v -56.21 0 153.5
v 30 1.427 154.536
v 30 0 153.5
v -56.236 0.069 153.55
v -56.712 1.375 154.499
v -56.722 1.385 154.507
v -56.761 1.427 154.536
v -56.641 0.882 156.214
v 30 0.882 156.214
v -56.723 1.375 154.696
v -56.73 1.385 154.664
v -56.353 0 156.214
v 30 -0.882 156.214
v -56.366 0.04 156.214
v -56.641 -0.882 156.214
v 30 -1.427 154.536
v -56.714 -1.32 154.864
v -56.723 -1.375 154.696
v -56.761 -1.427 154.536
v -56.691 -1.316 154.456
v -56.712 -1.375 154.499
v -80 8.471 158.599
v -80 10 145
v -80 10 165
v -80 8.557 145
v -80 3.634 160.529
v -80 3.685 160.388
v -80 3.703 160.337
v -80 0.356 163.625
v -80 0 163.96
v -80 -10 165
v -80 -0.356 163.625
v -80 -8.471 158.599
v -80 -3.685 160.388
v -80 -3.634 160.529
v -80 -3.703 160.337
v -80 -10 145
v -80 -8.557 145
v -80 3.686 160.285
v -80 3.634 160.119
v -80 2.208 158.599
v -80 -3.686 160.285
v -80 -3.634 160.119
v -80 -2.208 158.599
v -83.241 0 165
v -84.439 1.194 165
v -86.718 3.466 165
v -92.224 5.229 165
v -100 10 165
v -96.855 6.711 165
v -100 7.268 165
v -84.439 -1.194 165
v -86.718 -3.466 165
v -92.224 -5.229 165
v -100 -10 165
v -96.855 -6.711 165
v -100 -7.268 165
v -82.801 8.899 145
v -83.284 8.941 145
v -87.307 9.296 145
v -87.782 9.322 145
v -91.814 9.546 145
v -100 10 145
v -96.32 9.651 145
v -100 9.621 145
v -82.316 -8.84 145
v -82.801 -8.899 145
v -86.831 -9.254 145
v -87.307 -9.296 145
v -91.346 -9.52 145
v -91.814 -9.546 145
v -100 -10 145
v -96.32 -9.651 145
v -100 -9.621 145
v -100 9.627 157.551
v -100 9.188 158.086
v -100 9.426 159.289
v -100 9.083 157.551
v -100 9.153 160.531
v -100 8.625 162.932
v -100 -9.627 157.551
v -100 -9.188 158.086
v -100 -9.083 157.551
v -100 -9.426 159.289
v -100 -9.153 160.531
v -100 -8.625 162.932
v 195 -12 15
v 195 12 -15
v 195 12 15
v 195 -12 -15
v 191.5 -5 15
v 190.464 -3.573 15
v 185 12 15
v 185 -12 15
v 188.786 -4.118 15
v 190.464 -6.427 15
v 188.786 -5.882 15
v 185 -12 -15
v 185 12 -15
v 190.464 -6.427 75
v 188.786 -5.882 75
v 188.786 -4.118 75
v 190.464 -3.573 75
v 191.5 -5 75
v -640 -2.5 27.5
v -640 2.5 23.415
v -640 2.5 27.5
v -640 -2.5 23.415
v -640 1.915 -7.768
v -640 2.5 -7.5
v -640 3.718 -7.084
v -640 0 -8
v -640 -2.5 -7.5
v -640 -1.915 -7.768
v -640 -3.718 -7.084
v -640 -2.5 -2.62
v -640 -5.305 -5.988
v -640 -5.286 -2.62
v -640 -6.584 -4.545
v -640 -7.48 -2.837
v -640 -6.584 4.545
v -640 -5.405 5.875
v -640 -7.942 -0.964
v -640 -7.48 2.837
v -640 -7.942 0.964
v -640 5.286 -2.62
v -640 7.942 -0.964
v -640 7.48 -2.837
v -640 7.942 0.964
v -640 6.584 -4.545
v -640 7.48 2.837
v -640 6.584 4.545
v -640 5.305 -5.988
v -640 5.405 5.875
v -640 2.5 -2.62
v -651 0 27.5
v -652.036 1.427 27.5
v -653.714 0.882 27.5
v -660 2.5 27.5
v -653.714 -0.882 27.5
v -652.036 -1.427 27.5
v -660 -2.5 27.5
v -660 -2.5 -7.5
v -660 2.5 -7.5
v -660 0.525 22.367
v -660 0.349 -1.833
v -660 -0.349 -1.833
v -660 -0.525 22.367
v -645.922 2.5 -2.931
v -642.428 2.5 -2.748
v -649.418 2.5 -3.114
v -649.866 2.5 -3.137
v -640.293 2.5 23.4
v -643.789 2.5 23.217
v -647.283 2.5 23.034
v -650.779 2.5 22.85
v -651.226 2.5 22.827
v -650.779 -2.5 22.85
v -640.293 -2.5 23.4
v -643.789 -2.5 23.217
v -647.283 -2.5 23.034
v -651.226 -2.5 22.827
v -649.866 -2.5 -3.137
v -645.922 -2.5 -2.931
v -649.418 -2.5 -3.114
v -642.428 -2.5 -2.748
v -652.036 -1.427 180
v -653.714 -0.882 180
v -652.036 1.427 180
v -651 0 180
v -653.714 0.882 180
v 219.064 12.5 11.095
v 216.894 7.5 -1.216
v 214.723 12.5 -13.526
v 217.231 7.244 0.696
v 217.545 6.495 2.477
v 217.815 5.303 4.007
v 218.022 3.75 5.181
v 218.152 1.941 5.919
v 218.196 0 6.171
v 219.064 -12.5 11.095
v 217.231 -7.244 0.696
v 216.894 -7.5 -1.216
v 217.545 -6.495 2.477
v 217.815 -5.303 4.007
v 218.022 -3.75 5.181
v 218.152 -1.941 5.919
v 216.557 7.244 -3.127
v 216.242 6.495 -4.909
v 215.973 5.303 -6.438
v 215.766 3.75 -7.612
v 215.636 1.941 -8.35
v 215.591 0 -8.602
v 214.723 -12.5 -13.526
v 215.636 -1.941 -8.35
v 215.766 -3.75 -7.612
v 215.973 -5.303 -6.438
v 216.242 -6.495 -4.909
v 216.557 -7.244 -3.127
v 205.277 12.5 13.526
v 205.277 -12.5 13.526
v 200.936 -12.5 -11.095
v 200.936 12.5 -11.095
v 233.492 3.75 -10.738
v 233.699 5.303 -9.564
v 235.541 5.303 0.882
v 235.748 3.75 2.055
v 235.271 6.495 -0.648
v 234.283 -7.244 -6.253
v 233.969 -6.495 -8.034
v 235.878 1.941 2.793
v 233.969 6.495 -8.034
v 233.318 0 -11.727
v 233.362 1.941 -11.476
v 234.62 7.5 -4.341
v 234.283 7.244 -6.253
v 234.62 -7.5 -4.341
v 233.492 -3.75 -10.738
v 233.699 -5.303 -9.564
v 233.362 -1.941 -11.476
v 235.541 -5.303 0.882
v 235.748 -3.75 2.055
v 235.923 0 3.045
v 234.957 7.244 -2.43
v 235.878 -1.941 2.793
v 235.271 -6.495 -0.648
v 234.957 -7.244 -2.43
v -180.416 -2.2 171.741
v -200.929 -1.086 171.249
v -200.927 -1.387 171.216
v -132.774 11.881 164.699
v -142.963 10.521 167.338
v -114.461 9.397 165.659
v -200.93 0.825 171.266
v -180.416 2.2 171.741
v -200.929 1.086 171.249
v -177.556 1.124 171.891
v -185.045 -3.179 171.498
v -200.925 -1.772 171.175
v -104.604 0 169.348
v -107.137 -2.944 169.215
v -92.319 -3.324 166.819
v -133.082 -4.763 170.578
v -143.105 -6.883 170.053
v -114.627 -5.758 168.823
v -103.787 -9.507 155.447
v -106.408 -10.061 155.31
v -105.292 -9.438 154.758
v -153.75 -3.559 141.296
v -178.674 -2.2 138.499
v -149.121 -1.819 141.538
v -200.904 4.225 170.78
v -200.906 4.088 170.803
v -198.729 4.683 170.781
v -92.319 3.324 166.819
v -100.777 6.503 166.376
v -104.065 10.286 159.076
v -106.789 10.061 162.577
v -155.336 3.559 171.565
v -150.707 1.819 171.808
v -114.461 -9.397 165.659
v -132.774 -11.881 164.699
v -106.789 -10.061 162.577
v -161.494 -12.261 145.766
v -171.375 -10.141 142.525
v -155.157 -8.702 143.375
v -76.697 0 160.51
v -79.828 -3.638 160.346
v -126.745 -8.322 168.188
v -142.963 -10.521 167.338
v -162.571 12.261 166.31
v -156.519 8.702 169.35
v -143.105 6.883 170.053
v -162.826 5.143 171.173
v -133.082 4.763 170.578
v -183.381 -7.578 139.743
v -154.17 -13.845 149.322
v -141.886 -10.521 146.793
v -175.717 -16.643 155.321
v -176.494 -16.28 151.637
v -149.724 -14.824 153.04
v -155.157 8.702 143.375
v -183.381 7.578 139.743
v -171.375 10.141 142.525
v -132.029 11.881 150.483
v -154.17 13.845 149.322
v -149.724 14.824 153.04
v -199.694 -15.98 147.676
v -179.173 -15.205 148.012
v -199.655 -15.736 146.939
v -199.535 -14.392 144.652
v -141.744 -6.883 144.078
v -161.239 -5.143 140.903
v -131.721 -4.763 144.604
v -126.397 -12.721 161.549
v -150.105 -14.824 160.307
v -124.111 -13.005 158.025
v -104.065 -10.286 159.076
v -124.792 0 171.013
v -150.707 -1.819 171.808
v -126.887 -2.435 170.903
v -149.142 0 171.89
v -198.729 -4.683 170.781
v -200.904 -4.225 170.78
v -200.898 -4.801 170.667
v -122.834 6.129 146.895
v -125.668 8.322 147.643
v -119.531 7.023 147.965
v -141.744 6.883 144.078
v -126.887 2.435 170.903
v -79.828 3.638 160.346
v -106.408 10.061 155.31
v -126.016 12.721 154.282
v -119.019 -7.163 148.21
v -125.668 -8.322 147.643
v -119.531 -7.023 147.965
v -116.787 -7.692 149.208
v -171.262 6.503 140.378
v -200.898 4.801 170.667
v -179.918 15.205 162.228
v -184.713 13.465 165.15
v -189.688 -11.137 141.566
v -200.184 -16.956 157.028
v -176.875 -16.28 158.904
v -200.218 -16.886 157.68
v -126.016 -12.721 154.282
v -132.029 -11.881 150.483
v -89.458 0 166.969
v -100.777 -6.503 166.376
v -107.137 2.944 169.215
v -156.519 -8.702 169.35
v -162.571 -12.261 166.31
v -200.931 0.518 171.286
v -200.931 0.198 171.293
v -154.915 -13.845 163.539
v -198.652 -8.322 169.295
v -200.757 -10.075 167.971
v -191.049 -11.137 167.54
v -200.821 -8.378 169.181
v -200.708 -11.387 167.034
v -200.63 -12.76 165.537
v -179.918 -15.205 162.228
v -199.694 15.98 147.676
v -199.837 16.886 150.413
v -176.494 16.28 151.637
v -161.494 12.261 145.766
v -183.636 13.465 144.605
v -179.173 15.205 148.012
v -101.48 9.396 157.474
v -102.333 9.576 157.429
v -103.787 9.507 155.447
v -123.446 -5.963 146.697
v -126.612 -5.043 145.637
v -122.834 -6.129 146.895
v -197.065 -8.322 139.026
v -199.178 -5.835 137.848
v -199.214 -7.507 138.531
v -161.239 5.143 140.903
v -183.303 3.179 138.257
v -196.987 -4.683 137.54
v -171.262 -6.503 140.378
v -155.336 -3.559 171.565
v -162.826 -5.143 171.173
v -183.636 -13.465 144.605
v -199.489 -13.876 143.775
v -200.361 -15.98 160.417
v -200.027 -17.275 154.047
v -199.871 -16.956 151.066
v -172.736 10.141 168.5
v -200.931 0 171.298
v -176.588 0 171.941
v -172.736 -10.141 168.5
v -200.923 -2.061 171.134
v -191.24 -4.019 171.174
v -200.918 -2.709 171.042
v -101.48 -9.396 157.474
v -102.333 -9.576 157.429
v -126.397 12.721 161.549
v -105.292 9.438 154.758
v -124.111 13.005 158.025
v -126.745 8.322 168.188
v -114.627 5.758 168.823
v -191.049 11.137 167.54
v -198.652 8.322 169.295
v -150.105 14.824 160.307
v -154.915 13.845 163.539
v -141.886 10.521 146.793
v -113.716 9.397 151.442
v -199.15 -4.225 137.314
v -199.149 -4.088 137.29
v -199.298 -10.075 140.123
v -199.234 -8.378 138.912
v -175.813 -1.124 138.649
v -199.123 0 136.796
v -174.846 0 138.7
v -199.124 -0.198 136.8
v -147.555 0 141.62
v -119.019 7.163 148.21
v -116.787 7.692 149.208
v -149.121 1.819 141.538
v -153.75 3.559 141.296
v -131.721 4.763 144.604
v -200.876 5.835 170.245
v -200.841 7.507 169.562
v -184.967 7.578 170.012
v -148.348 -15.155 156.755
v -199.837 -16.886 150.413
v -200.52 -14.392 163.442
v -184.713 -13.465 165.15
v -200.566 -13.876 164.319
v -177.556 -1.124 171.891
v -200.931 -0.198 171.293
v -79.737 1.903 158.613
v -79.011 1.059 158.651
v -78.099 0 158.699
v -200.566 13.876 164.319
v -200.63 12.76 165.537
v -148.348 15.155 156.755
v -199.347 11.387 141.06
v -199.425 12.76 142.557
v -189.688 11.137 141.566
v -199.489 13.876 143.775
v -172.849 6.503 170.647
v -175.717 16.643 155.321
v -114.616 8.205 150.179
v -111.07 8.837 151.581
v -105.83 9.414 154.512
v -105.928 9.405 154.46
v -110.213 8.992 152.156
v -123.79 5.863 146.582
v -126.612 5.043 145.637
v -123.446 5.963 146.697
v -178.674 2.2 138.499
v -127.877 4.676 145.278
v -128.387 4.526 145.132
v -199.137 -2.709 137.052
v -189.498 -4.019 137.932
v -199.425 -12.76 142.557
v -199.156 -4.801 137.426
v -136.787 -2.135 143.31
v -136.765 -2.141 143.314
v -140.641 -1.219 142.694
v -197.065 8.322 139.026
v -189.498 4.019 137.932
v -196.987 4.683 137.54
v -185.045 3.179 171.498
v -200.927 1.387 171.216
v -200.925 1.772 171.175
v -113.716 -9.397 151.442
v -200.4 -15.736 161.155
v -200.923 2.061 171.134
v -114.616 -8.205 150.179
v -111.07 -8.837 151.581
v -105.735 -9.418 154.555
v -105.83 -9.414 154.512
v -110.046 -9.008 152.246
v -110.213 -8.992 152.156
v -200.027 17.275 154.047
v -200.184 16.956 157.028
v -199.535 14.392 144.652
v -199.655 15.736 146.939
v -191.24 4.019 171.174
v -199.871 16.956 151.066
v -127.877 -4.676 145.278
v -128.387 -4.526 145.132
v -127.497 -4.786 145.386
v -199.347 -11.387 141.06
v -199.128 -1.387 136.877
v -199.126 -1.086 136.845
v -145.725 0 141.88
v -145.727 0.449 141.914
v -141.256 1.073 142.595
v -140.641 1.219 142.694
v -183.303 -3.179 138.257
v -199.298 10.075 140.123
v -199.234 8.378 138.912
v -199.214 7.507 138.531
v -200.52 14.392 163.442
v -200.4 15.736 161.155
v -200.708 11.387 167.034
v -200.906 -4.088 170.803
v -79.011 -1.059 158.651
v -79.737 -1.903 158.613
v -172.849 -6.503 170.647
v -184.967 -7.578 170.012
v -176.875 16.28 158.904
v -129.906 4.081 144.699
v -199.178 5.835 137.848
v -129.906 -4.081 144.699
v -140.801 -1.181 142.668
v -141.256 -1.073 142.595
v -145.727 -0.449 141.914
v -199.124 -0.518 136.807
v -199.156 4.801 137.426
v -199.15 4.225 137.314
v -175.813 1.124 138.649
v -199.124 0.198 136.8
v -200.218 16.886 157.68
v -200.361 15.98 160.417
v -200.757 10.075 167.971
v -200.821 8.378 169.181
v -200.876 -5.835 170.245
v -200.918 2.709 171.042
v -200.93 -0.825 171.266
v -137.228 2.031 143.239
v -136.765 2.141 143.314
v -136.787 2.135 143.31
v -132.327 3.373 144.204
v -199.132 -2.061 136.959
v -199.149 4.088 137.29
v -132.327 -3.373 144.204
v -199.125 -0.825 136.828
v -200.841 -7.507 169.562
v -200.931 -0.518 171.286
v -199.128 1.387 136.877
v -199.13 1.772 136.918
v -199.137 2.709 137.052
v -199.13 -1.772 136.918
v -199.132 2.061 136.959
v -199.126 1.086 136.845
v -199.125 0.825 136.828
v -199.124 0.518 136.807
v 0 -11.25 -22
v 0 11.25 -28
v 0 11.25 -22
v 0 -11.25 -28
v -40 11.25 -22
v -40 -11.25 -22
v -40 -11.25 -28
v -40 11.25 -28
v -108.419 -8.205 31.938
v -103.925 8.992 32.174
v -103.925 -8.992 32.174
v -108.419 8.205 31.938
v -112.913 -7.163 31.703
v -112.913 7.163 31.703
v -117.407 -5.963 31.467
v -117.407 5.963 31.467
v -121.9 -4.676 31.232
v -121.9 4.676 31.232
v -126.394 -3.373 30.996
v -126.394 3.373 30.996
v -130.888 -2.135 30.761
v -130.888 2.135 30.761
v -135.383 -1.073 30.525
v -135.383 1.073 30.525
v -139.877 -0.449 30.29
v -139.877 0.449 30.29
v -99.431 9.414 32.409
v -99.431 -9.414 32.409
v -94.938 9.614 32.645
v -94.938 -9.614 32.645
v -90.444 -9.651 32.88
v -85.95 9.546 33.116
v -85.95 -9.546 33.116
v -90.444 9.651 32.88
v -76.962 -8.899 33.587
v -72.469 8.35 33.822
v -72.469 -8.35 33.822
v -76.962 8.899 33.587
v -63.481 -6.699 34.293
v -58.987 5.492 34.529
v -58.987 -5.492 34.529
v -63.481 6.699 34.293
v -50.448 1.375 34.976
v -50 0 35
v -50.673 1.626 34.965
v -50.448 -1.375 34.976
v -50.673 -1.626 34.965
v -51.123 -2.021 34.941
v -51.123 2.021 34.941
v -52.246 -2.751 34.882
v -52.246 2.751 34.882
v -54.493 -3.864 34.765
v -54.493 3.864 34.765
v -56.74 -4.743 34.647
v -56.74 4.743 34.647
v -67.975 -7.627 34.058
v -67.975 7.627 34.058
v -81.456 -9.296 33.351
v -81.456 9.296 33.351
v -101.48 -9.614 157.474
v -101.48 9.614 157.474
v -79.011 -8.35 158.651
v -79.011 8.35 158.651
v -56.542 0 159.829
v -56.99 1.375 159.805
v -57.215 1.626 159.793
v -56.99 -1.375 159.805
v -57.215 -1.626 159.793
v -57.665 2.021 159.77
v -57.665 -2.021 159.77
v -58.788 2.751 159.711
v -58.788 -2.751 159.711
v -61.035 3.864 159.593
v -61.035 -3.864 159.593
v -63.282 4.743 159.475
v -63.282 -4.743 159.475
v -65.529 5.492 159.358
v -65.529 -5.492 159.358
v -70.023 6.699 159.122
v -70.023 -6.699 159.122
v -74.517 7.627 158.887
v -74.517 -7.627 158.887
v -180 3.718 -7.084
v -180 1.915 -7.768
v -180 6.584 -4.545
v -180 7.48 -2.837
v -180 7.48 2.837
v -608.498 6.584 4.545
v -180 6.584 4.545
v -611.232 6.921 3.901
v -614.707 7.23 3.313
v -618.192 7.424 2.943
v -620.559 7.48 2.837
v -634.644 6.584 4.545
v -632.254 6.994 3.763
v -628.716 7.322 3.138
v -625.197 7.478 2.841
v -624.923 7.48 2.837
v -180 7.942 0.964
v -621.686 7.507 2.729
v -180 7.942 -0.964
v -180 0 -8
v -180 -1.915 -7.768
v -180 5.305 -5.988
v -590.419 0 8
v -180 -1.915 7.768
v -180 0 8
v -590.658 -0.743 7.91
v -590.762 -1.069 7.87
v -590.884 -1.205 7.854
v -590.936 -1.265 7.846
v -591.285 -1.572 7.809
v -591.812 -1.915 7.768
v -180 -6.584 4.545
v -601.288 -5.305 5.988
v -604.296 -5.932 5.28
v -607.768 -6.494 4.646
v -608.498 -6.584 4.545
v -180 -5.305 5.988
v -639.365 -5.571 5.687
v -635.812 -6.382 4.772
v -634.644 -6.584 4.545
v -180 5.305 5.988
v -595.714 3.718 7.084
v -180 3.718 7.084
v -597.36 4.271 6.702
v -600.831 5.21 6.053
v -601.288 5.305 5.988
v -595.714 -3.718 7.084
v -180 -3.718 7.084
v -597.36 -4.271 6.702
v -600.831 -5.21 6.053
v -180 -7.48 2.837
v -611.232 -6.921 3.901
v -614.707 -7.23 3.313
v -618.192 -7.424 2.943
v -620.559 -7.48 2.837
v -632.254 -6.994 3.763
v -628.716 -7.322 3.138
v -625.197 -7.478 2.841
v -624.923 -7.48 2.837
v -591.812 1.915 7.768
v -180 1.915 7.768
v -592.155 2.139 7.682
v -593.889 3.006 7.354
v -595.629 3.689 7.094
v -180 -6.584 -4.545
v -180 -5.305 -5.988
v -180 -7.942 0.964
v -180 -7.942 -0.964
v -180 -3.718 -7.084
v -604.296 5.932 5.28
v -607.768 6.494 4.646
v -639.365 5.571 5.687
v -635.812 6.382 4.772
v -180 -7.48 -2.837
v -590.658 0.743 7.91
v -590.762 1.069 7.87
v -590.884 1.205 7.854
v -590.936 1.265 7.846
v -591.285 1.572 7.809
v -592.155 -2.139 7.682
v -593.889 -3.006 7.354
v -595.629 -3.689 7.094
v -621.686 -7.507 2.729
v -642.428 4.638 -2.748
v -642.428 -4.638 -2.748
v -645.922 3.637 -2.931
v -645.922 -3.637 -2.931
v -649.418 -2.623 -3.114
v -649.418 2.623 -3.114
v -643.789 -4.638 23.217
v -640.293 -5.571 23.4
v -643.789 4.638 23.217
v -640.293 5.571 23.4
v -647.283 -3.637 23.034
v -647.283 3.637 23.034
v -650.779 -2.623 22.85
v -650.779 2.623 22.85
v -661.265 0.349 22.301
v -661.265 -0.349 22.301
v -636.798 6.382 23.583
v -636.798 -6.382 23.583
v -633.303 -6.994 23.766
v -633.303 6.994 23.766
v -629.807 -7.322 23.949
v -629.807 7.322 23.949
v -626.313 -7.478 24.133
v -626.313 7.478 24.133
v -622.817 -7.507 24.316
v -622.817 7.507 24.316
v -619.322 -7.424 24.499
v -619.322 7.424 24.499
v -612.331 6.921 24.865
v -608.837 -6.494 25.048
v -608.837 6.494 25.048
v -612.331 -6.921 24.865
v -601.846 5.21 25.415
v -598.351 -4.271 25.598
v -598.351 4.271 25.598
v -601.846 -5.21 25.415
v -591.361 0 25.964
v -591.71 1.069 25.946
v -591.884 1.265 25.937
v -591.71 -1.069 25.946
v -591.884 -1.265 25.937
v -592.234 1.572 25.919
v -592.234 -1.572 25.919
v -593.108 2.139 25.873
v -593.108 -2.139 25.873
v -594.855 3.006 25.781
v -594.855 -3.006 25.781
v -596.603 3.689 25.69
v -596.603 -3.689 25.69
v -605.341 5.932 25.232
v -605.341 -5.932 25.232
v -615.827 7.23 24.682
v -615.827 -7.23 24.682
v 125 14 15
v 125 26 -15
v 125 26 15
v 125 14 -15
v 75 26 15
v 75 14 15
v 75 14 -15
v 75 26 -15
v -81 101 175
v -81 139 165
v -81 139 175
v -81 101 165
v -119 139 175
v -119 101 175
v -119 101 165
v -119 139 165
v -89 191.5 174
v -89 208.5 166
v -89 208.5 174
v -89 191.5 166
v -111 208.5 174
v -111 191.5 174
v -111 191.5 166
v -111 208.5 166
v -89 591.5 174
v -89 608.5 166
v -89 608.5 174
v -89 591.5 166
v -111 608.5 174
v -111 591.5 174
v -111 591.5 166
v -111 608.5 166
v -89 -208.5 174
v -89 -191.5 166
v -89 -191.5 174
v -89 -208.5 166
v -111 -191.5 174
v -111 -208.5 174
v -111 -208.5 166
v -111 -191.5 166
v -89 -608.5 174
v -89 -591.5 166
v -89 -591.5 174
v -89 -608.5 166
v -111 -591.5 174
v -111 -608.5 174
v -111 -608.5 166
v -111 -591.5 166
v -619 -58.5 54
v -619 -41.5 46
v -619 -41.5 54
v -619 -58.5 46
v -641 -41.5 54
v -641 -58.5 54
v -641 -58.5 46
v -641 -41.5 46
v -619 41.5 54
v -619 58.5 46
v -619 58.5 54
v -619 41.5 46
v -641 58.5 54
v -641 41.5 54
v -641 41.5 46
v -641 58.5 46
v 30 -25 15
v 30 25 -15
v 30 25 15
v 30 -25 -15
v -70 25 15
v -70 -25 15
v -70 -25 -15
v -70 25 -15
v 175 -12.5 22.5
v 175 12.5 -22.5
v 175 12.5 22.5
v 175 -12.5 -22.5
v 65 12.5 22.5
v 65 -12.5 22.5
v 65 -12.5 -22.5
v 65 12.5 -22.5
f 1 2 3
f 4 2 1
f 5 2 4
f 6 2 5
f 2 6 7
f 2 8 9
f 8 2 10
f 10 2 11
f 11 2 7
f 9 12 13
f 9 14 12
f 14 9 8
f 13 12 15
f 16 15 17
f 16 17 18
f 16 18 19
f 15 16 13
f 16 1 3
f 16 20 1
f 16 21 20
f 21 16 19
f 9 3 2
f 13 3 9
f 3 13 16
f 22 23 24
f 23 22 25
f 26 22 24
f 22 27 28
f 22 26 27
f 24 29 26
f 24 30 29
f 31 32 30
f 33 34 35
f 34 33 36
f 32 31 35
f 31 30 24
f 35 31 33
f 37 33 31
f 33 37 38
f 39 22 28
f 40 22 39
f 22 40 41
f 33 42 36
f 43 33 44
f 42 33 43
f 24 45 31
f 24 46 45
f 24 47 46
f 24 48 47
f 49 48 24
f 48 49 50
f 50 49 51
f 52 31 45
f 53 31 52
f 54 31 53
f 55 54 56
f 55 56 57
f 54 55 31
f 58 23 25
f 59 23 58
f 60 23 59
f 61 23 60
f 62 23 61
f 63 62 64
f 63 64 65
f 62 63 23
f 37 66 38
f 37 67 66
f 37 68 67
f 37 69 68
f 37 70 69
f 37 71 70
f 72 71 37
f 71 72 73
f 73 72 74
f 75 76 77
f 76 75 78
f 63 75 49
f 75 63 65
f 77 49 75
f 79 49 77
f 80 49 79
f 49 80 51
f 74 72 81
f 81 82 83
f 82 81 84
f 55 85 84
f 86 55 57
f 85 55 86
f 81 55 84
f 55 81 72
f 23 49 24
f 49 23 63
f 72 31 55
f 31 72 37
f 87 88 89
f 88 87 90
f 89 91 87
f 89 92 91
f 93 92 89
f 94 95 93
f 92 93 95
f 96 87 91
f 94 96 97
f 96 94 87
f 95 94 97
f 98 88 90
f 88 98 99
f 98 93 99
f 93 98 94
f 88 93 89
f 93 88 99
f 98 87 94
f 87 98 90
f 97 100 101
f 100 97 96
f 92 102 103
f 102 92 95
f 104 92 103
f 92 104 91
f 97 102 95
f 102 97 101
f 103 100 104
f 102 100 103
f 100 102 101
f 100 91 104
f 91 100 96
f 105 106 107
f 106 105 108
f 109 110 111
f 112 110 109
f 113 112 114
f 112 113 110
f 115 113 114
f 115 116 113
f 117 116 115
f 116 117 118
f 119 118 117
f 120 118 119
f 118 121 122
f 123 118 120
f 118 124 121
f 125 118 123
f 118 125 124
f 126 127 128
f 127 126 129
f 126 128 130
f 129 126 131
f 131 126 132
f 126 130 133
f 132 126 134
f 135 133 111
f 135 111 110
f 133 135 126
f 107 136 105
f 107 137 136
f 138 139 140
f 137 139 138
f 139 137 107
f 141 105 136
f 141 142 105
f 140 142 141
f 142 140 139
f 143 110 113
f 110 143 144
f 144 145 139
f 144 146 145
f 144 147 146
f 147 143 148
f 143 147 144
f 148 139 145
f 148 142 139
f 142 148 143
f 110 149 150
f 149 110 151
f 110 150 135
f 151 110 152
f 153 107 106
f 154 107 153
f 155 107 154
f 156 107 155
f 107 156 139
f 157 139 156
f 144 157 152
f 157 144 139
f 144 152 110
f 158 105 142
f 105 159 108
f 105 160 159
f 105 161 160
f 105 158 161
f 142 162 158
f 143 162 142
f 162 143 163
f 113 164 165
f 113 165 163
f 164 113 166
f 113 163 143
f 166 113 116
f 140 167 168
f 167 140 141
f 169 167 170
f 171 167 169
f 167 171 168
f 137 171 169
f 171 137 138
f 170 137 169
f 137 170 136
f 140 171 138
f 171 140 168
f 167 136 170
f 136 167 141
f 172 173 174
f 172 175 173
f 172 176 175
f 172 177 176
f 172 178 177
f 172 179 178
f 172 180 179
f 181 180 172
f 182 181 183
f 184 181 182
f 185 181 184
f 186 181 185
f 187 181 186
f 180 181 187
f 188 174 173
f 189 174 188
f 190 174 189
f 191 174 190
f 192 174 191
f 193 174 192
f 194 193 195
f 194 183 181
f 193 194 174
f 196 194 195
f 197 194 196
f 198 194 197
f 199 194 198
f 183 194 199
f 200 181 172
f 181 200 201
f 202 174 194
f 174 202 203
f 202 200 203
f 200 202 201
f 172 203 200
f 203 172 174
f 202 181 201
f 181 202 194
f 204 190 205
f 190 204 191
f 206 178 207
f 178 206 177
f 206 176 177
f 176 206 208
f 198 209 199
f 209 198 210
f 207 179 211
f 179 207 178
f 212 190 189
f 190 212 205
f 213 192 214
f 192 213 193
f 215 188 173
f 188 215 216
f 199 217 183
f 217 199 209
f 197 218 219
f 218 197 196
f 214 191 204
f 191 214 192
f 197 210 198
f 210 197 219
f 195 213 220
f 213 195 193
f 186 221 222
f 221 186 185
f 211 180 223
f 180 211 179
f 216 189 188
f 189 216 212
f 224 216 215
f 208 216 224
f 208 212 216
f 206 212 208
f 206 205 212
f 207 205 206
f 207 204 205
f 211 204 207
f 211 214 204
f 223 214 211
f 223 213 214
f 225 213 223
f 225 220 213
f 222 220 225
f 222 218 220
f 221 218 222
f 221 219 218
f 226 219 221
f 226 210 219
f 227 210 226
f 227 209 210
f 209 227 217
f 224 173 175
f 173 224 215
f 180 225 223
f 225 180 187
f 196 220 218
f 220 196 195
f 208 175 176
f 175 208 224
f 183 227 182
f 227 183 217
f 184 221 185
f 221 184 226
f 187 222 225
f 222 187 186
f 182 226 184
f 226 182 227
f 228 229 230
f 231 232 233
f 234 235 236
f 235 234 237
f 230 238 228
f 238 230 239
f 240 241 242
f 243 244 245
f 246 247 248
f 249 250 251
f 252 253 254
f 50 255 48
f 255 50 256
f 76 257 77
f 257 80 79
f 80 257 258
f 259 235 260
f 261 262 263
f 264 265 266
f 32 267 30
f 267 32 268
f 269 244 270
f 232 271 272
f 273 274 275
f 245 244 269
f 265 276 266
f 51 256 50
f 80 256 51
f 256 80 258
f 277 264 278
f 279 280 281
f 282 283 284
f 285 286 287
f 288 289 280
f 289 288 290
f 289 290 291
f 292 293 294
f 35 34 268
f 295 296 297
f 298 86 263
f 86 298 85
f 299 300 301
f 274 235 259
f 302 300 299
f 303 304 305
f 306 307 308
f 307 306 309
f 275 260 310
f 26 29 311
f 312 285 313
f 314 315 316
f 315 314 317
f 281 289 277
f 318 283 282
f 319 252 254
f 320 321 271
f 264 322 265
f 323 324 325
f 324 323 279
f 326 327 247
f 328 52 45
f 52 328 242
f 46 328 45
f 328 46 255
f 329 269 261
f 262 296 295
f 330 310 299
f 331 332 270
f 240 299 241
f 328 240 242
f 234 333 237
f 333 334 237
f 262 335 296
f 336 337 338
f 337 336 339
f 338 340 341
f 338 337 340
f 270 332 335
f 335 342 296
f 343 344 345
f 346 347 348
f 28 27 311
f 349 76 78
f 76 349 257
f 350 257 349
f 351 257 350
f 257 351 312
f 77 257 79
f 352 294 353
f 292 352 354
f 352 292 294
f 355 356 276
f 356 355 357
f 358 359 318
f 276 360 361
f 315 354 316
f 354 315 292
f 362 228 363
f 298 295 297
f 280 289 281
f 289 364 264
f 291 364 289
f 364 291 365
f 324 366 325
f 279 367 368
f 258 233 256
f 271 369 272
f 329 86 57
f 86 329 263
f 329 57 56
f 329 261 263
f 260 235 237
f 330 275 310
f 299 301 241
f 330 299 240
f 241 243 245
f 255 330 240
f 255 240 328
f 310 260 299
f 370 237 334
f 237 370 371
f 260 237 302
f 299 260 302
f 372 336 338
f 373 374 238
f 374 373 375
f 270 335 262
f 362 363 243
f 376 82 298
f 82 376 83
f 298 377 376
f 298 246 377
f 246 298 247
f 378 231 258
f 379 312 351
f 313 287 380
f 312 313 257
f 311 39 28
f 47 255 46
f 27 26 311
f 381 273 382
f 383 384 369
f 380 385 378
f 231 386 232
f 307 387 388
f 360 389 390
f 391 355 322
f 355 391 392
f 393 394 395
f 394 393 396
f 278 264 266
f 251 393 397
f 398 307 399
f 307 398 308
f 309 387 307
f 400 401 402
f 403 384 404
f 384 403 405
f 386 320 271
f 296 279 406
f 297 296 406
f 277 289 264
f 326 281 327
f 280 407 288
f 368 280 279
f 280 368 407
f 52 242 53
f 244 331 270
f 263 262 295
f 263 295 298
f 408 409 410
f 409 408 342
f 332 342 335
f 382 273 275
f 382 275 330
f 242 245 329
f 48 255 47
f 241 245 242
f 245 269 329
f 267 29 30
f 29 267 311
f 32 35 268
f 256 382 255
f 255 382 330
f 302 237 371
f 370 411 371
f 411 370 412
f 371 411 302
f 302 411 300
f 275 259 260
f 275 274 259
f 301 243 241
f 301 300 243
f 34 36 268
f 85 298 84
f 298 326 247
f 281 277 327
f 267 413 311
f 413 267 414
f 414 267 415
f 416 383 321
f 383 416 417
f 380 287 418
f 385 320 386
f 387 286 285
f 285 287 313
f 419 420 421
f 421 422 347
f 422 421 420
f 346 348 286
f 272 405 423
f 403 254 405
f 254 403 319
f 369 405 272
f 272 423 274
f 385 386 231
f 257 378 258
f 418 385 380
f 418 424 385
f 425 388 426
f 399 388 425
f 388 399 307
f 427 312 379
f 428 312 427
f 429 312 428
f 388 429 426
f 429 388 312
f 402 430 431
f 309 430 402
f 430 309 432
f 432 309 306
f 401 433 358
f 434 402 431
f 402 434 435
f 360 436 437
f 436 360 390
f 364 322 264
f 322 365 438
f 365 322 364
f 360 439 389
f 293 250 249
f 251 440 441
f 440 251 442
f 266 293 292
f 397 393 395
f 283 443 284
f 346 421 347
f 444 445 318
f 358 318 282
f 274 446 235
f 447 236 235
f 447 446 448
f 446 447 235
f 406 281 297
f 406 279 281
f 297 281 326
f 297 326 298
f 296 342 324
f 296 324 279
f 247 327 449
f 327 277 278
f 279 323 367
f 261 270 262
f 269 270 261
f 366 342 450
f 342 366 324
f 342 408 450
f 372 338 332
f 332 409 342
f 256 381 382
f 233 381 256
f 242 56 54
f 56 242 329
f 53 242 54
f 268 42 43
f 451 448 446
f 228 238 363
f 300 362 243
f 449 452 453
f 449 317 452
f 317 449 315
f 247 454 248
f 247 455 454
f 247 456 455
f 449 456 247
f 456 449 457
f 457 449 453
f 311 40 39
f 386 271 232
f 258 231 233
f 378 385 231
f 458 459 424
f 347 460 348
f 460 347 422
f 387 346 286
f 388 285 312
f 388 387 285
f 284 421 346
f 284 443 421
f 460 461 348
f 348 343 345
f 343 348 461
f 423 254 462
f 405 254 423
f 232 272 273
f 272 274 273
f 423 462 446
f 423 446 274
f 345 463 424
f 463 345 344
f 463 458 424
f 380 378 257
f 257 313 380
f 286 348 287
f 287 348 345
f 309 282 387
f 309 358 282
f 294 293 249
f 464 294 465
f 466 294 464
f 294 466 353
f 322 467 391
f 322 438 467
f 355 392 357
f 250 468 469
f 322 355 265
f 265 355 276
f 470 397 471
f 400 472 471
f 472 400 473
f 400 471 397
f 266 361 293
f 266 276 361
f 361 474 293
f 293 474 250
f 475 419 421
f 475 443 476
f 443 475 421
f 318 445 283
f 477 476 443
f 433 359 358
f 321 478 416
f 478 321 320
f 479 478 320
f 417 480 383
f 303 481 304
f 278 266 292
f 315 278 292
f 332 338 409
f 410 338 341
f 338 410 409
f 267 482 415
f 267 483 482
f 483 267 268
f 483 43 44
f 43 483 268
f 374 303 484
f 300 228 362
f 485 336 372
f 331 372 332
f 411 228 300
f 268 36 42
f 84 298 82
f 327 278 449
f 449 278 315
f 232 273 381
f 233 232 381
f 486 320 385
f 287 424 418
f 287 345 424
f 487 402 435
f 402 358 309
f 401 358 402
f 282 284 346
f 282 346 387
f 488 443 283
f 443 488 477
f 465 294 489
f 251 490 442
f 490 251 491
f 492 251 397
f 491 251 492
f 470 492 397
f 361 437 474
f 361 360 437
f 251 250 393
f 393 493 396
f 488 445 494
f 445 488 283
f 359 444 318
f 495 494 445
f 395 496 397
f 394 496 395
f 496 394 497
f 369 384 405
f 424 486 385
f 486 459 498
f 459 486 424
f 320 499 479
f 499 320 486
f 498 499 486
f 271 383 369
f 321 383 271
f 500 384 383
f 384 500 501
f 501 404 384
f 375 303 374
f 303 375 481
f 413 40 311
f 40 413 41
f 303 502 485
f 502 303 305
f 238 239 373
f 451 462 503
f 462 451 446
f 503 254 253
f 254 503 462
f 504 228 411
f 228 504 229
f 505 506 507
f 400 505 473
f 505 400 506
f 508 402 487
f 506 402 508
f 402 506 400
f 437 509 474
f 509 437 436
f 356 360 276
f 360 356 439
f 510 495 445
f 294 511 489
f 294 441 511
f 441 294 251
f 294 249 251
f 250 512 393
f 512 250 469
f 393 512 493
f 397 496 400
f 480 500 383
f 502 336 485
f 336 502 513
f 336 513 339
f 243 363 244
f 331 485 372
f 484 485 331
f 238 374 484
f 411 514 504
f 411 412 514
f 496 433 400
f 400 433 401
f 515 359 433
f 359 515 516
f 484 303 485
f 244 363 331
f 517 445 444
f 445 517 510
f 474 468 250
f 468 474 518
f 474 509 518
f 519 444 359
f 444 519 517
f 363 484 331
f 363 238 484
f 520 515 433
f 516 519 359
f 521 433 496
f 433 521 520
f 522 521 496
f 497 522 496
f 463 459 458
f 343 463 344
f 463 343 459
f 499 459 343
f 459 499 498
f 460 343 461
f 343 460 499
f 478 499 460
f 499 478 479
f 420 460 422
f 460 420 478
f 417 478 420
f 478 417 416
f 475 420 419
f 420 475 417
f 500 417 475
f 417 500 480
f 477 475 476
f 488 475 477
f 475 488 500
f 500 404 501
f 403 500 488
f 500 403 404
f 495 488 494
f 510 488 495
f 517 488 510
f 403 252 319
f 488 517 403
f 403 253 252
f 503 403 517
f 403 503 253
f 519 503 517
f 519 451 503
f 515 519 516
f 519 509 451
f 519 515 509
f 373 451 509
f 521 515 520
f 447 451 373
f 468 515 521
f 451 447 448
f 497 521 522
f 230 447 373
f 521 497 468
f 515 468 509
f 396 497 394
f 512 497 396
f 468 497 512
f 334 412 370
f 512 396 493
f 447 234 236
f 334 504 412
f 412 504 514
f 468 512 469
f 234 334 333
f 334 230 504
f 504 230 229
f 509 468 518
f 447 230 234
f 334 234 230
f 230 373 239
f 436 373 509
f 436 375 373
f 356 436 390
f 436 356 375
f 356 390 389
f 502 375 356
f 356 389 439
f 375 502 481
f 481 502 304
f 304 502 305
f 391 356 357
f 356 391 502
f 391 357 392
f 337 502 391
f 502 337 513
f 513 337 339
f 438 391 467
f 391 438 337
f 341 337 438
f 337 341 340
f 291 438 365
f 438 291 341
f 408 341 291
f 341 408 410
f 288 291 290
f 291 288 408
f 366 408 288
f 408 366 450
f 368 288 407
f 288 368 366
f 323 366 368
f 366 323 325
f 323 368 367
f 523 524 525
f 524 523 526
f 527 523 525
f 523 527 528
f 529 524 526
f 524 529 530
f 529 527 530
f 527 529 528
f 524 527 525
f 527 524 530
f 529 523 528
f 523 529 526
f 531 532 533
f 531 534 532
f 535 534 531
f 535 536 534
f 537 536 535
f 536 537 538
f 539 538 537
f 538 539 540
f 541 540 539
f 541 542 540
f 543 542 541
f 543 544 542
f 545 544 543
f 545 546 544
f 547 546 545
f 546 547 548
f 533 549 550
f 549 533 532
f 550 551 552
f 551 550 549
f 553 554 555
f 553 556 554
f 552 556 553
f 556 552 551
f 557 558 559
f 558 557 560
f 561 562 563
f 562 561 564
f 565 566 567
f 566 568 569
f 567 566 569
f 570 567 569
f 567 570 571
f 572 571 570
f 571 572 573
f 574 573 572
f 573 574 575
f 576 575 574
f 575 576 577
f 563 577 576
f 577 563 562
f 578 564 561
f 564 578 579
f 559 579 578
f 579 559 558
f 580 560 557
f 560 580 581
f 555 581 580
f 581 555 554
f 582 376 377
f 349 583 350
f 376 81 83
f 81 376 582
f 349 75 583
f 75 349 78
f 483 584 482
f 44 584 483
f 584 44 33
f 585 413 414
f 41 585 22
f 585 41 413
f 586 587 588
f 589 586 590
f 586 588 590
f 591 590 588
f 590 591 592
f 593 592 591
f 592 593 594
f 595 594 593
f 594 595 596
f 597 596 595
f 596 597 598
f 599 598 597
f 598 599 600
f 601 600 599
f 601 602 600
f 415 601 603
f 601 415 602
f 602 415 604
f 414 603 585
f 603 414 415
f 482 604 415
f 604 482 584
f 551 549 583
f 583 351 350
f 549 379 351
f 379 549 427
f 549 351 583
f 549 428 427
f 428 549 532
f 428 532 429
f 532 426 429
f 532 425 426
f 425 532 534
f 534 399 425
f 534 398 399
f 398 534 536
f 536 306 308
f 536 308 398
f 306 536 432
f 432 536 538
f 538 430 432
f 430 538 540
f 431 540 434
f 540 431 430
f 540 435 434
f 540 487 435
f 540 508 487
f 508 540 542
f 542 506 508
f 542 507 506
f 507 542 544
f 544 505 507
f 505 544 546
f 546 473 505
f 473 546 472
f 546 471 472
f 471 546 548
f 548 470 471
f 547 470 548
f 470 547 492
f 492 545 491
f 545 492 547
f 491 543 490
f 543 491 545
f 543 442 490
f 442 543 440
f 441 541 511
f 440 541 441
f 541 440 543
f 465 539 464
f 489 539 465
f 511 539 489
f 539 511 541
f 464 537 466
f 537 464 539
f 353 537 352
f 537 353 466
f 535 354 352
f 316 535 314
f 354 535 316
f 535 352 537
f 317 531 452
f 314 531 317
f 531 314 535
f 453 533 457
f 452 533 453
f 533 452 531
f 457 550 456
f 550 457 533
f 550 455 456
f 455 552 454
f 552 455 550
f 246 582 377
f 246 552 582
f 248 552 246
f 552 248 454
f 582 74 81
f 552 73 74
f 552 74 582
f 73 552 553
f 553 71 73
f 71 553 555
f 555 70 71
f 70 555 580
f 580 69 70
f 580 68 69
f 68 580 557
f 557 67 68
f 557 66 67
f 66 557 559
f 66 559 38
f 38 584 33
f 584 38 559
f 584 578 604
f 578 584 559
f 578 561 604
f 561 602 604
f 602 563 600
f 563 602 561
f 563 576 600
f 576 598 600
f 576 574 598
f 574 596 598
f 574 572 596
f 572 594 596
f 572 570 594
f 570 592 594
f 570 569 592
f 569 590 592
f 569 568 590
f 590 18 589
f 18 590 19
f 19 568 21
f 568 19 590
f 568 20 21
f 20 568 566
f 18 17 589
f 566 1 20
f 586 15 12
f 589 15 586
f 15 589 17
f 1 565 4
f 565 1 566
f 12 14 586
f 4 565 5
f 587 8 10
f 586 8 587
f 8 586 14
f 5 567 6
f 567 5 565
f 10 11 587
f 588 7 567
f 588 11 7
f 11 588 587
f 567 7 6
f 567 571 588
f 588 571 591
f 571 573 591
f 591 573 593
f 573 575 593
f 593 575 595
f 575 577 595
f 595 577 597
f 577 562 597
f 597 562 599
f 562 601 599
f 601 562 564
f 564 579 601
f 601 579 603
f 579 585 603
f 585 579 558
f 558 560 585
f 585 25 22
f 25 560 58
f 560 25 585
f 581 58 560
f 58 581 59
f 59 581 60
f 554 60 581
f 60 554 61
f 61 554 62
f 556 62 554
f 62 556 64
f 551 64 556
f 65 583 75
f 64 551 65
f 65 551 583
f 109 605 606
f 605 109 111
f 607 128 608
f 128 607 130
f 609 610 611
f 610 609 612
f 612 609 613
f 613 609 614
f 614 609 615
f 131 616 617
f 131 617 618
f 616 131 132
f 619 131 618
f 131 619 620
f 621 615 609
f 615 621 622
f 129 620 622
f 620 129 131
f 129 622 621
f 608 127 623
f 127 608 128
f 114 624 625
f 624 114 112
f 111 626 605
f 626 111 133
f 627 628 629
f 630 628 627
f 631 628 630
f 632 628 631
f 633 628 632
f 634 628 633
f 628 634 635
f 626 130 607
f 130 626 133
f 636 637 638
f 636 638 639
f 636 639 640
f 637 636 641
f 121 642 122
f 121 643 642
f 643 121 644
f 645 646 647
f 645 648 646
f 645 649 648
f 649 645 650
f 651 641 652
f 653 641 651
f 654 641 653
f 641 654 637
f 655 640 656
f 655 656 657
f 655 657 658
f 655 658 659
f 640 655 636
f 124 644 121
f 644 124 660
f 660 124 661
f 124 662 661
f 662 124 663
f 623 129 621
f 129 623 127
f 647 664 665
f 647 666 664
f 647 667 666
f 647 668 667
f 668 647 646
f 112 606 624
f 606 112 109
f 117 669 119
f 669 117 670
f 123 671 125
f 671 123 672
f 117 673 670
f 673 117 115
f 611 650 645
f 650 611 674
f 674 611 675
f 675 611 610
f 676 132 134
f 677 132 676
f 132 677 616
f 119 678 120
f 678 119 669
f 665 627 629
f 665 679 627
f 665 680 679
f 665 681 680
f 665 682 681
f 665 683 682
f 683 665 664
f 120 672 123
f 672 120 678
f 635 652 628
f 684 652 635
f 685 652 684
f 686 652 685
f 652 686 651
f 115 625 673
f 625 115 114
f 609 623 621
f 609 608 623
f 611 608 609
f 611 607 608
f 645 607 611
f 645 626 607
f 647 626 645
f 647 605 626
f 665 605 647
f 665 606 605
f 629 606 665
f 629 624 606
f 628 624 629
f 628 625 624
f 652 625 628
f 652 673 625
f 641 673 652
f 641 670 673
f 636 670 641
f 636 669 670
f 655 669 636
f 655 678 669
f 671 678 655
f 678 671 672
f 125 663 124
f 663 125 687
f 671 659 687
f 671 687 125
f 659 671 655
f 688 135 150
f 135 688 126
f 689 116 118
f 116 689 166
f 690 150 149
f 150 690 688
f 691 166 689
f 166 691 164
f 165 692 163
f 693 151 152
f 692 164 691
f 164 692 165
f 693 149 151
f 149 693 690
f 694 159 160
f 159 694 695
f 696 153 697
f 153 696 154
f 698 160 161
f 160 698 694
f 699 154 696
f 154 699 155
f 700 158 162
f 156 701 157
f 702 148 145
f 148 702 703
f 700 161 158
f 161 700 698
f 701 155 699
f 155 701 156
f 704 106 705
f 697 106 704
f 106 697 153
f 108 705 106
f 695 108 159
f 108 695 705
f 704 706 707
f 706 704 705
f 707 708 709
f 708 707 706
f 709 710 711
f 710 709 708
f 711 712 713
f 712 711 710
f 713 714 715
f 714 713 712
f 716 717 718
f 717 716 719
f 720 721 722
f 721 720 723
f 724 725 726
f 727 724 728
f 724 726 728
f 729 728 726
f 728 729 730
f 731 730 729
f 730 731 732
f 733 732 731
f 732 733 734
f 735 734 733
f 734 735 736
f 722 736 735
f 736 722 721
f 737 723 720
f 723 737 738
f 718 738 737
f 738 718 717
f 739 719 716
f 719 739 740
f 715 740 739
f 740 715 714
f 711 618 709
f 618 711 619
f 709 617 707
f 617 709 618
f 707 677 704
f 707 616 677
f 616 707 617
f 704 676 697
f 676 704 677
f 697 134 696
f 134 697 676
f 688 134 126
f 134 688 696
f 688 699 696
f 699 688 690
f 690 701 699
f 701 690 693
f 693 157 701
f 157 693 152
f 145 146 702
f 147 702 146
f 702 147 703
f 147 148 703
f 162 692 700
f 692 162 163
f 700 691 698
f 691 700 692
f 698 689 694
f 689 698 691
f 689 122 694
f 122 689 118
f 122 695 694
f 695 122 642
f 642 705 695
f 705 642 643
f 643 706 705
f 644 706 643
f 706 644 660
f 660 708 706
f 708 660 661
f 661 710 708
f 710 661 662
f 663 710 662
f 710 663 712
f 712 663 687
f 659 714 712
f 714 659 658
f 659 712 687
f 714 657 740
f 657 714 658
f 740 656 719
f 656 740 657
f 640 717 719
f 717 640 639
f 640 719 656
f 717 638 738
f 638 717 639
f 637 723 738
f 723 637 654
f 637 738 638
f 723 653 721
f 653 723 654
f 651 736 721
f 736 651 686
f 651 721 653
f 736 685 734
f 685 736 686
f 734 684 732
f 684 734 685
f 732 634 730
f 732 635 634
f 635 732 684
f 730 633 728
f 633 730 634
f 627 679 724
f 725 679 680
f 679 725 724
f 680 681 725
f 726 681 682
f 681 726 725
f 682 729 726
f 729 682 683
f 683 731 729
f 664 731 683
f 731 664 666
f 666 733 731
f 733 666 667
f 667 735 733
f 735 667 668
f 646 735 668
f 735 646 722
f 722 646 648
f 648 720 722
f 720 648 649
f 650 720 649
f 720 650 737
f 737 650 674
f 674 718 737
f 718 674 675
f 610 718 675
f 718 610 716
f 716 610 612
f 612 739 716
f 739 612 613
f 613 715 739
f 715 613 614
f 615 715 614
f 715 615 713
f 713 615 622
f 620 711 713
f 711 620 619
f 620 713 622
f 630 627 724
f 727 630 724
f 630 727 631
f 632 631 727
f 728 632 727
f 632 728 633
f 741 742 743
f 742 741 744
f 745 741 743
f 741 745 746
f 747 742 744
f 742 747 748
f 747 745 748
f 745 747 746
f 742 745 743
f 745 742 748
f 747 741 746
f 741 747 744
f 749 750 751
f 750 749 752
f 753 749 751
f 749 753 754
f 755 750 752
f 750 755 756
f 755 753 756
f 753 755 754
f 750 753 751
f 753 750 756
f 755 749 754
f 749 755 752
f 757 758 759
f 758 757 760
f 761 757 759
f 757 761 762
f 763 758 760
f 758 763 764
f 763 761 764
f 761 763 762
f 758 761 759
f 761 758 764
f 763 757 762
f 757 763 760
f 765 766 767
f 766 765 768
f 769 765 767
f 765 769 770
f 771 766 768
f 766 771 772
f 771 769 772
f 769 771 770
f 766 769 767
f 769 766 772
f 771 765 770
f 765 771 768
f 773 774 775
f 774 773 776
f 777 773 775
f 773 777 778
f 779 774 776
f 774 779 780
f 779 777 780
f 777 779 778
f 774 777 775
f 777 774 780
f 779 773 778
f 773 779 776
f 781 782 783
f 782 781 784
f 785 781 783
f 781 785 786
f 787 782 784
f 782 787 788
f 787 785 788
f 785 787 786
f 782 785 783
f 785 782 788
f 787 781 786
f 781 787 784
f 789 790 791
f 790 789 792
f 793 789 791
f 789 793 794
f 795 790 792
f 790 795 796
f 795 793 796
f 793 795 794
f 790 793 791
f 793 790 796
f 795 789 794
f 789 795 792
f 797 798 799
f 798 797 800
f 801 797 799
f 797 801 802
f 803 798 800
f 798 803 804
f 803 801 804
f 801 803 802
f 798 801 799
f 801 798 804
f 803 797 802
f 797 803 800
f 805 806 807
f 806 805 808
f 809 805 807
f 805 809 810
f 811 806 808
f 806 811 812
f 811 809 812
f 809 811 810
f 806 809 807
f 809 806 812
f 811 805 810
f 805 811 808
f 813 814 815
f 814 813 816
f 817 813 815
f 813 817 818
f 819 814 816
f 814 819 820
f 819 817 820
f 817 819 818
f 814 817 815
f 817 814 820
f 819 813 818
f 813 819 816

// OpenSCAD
/*

Tranquility FPV thermal soarer.

Copyright (C) 2017 Andy Little

 This program is free software: you can redistribute it and/or modify
 it under the terms of the GNU General Public License as published by
 the Free Software Foundation, either version 3 of the License or
 (at your option) any later version.

 This program is distributed in the hope that it will be useful,
 but WITHOUT ANY WARRANTY; without even the implied warranty of
 MERCHANTABILITY or FITNESS FOR A PARTICULAR PURPOSE. See the
 GNU General Public License for more details.

 You should have received a copy of the GNU General Public License
 along with this program. If not, see http://www.gnu.org/licenses./
*/


module fuselage_pod(){
   scale([6,1,1]){
      sphere(d = 80);
   }
}

module tail_boom(){
  translate([-640,0,0]){
     rotate([0,90,0]){
       cylinder (d = 16, h = 460);
     }
  }
}

module pylon(){
  translate([-50,0,35]){
     rotate([0,-3,0]){
     linear_extrude(height = 125){
       scale([90,90,1]){
       rotate([0,0,180]){
          NACA66021();
       }
      }
     }
   }
  }
}

wing_span = 1800;
root_chord = 180;
mid_chord = 170;
tip_chord = 120;
centre_section_width = 25;

module flight_controller()
{
  cube ([100,50,30],center =true);
}

module wing(){
   translate([-80,0,160]){

      polygon( points = [ 
         [root_chord/3,0],
         [root_chord/3,centre_section_width/2],
         [mid_chord/3,wing_span/4 + centre_section_width/2],
          [-mid_chord *2/3,wing_span/4 + centre_section_width/2],
         [-root_chord*2/3,centre_section_width/2],
         [-root_chord*2/3,0]
        ]);

       translate([0,(wing_span/4 + centre_section_width/2),0]){
       rotate([5,0,0]){
       translate([0,-(wing_span/4 + centre_section_width/2),0]){
        polygon( points = [
         [mid_chord/3,wing_span/4 + centre_section_width/2],
         [tip_chord/3,wing_span/2 - tip_chord/3 + centre_section_width/2],
         [0,wing_span/2 + centre_section_width/2],
         [-tip_chord *2/3,wing_span/2 + centre_section_width/2],
          [-mid_chord *2/3,wing_span/4 + centre_section_width/2]
       ]);
       }
       }
       }
         
/*
      rotate([2,-3,0]){
        polygon( points = [
         [root_chord/3,0],
         [root_chord/3,centre_section_width/2],
         [mid_chord/3,wing_span/4 + centre_section_width/2],
         [tip_chord/3,wing_span/2 - tip_chord/3 + centre_section_width/2],
         [0,wing_span/2 + centre_section_width/2],
         [-tip_chord *2/3,wing_span/2 + centre_section_width/2],
         [-mid_chord *2/3,wing_span/4 + centre_section_width/2],
         [-root_chord*2/3,centre_section_width/2],
         [-root_chord*2/3,0]
        ]);
      }
*/
   }
}
tail_span= wing_span / 3;
tail_root_chord = 120;
tail_tip_chord = 90;

module tail()
{
    translate([-700,0,20]){
     translate([110,0,-20]){
        rotate([0,-3,0]){
        linear_extrude(height = 26){
          scale([70,70,1]){
          rotate([0,0,180]){
             NACA66021();
          }
         }
        }
      }
     }
    
    rotate([30,-1.5,0]){
       polygon( points = [
         [0,0],
         [tail_root_chord,0],
         [tail_tip_chord,tail_span/2- tail_tip_chord/2],
         [tail_tip_chord/2,tail_span/2],
         [0,tail_span/2]
       ]);
    }
  }
}

module camera()
{
  color([0.3,0.3,0.3]){
    rotate([0,10,0]){
		 cube([14,25,25],center= true);
	   rotate([0,90,0]){
	  	   cylinder(r=7.5,h=25);
	   }
    }
  }
}

module motor(){
         rotate([0,-3,0]){
     translate([-20,0,0]){
        rotate([0,90,0]){
            
            %difference(){
                  cylinder(r=120, h = 0.25);
                  translate([0,0,-1]){
                  cylinder( r = 119, h= 12);
                  }
            }
        }
     }
     difference(){
      scale([8.2,1,1]){
         sphere(d=35);
      }
      translate([-200,-50,-50]){
         cube([220,100,100]);
      }
   }
   }
}

module gps()
{
	color([0.2,0.8,0.0]){
  cube([38,38,10],center = true);
  }
}

module battery()
{
  color([0.1,0.2,0.6]){
	  cube([110,25,45],center = true);
  }
}

module wing_servo()
{
color([.3,0.2,0.3]){
 cube([22,17,8],center = true);
}
}

module esc()
{
color([.5,0,.5]){
	cube([50,12,30],center = true);
}
}

module rcrx()
{
color([.3,0.2,0.3]){
	cube([40,22.5,6],center = true);
}
}

module ias()
{
  rotate([0,90,0]){
	cylinder (d= 3, h = 120);
  }
  cube([20,20,20],center = true);
}

module vtx()
{
	cube([10,24,30],center = true);
   translate([0,-5,0]){
		cylinder(r=1.5,h = 75);
	}
}

module telem(){
   cube([20,5,35],center = true);
   translate([-2.5,0,0]){
		cylinder(r=1.5,h = 170);
	}
}

module NACA66021(){
   polygon(points = [
      [1,0.005]
      ,[0.95,0.01192]
      ,[0.9,0.02374]
      ,[0.85,0.03749]
      ,[0.8,0.05196]
      ,[0.75,0.06626]
      ,[0.7,0.0796]
      ,[0.65,0.09118]
      ,[0.6,0.09992]
      ,[0.55,0.10461]
      ,[0.5,0.10684]
      ,[0.45,0.10725]
      ,[0.4,0.10607]
      ,[0.35,0.10329]
      ,[0.3,0.09888]
      ,[0.25,0.09278]
      ,[0.2,0.08476]
      ,[0.15,0.07444]
      ,[0.1,0.06102]
      ,[0.075,0.052705]
      ,[0.05,0.04294]
      ,[0.025,0.030575]
      ,[0.0125,0.0224625]
      ,[0.0075,0.0180775]
      ,[0.005,0.015275]
      ,[0,0]
      ,[0.005,-0.015275]
      ,[0.0075,-0.0180775]
      ,[0.0125,-0.0224625]
      ,[0.025,-0.030575]
      ,[0.05,-0.04294]
      ,[0.075,-0.052705]
      ,[0.1,-0.06102]
      ,[0.15,-0.07444]
      ,[0.2,-0.08476]
      ,[0.25,-0.09278]
      ,[0.3,-0.09888]
      ,[0.35,-0.10329]
      ,[0.4,-0.10607]
      ,[0.45,-0.10725]
      ,[0.5,-0.10684]
      ,[0.55,-0.10461]
      ,[0.6,-0.09992]
      ,[0.65,-0.09118]
      ,[0.7,-0.0796]
      ,[0.75,-0.06626]
      ,[0.8,-0.05196]
      ,[0.85,-0.03749]
      ,[0.9,-0.02374]
      ,[0.95,-0.01192]
      ,[1,-0.005]

   ]);
}

translate([-90,0,155]){
   ias();
}

translate([-20,0,-25]){
   rcrx();
}

translate([190,0,0]){
   vtx();
}

%fuselage_pod();

pylon();
tail_boom();

wing();
mirror([0,1,0]){wing();}
tail();
mirror([0,1,0]){tail();}

translate([100,20,0]){
   esc();
}

translate([-100,120,170]){
   gps();
}

translate([-650,0,10]){
   telem();
}

translate([-100,200,170]){
   wing_servo();
}

translate([-100,600,170]){
   wing_servo();
}

translate([-100,-200,170]){
   wing_servo();
}

translate([-100,-600,170]){
   wing_servo();
}

translate([-630,-50,50]){
   wing_servo();
}

translate([-630,50,50]){
   wing_servo();
}

translate([-20,0,0]){
  flight_controller();
}

translate([210,0,0]){
   camera();
}

translate([-220,0,153]){
  motor();
}

translate([120,0,0]){
   rotate([0,0,0]){
      battery();
   }
}
